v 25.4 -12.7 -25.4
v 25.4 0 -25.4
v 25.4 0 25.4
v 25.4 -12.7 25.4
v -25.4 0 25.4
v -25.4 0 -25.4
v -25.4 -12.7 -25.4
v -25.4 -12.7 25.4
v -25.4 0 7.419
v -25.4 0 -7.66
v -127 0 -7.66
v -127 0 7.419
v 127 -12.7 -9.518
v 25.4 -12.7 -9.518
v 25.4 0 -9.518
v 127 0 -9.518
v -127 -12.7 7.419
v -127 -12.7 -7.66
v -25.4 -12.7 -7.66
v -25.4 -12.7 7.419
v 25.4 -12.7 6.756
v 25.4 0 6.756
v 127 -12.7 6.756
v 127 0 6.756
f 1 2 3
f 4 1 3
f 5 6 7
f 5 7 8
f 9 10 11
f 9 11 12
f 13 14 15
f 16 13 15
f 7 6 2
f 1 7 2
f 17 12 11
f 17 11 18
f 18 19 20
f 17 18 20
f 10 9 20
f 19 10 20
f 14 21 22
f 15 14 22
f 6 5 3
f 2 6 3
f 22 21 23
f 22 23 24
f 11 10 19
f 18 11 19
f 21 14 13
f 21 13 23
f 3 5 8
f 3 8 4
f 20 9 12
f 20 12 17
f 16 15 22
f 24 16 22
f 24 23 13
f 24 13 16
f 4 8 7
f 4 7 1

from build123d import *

# Parameters (mm, degrees)
F0_W     = 50.8
F0_H     = 50.8
F1_DEPTH = 12.7
F2_W     = 12.7
F2_H     = 15.078536
F3_DEPTH = 101.6
F4_W     = 12.7
F4_H     = 16.273961
F5_DEPTH = 101.6


with BuildPart() as f1:
    # F0 (on Front) → F1 (new body)
    with BuildSketch(Plane.XZ):
        Rectangle(F0_W, F0_H)
    extrude(amount=F1_DEPTH)


with BuildPart() as f3:
    # F2 (on face) → F3 (new body)
    with BuildSketch(Plane(origin=(-25.4, 0, 0), x_dir=(0, -1, 0), z_dir=(-1, 0, 0))):
        with Locations((6.35, -0.120708)):
            Rectangle(F2_W, F2_H)
    extrude(amount=F3_DEPTH)


with BuildPart() as f5:
    # F4 (on face) → F5 (new body)
    with BuildSketch(Plane.YZ.offset(25.4)):
        with Locations((-6.35, -1.381001)):
            Rectangle(F4_W, F4_H)
    extrude(amount=F5_DEPTH)


solid = Compound([f1.part, f3.part, f5.part])
